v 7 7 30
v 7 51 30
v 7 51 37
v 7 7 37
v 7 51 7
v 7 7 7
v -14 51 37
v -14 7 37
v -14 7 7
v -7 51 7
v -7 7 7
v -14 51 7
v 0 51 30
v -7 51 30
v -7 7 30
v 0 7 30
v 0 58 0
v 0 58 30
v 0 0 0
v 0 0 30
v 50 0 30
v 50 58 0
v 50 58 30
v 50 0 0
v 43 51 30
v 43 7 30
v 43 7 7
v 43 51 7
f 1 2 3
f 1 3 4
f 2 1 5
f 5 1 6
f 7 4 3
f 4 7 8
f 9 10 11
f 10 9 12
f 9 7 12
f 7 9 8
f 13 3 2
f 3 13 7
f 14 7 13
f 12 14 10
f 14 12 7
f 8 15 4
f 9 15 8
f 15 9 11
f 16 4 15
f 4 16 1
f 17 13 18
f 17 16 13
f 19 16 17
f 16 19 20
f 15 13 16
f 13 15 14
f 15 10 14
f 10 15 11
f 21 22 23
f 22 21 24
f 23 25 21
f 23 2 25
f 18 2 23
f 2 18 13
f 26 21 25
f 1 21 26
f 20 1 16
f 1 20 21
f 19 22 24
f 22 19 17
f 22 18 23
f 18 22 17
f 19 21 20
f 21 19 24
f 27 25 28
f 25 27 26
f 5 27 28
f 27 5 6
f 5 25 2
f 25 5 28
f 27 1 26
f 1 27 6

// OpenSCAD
spielraum = 2;
wanddicke = 7;
wanddicke_vogelhaus = 7;

hook_x = wanddicke_vogelhaus + 2*wanddicke;
hook_y = 46 - spielraum;
hook_z = 30;

hookinner_x = wanddicke_vogelhaus;
hookinner_y = hook_y + 2*spielraum;
hookinner_z = hook_z - wanddicke + spielraum;

box_x = 50;
box_y = hook_y + 2*wanddicke;
box_z = 30;

boxinner_x = box_x - 2* wanddicke;
boxinner_y = box_y - 2*wanddicke;
boxinner_z = box_z - wanddicke + spielraum;


color("#00ff00") union() {      // verbindet Box mit Hook
    translate ([-(wanddicke + wanddicke_vogelhaus), wanddicke, wanddicke]) difference() {   // zieht inneren Hook von Hook ab

        cube([hook_x, hook_y, hook_z]); //äußere Kanten Hook

        translate([wanddicke, -spielraum, -spielraum]) color("#ff0000") cube ([hookinner_x, hookinner_y, hookinner_z]); // innere Kanten Hook
    }


    difference() {  //zieht innere Box von Box ab
        cube([box_x, box_y, box_z]);    //äußere Kanten Box

        translate([wanddicke, wanddicke, wanddicke]) color("#ff0000") cube([boxinner_x, boxinner_y, boxinner_z]);    // innere Kanten Box
    }
}


// translate([-150, -spielraum/2, -10]) color("#0000ff") cube([150,60,40]);
